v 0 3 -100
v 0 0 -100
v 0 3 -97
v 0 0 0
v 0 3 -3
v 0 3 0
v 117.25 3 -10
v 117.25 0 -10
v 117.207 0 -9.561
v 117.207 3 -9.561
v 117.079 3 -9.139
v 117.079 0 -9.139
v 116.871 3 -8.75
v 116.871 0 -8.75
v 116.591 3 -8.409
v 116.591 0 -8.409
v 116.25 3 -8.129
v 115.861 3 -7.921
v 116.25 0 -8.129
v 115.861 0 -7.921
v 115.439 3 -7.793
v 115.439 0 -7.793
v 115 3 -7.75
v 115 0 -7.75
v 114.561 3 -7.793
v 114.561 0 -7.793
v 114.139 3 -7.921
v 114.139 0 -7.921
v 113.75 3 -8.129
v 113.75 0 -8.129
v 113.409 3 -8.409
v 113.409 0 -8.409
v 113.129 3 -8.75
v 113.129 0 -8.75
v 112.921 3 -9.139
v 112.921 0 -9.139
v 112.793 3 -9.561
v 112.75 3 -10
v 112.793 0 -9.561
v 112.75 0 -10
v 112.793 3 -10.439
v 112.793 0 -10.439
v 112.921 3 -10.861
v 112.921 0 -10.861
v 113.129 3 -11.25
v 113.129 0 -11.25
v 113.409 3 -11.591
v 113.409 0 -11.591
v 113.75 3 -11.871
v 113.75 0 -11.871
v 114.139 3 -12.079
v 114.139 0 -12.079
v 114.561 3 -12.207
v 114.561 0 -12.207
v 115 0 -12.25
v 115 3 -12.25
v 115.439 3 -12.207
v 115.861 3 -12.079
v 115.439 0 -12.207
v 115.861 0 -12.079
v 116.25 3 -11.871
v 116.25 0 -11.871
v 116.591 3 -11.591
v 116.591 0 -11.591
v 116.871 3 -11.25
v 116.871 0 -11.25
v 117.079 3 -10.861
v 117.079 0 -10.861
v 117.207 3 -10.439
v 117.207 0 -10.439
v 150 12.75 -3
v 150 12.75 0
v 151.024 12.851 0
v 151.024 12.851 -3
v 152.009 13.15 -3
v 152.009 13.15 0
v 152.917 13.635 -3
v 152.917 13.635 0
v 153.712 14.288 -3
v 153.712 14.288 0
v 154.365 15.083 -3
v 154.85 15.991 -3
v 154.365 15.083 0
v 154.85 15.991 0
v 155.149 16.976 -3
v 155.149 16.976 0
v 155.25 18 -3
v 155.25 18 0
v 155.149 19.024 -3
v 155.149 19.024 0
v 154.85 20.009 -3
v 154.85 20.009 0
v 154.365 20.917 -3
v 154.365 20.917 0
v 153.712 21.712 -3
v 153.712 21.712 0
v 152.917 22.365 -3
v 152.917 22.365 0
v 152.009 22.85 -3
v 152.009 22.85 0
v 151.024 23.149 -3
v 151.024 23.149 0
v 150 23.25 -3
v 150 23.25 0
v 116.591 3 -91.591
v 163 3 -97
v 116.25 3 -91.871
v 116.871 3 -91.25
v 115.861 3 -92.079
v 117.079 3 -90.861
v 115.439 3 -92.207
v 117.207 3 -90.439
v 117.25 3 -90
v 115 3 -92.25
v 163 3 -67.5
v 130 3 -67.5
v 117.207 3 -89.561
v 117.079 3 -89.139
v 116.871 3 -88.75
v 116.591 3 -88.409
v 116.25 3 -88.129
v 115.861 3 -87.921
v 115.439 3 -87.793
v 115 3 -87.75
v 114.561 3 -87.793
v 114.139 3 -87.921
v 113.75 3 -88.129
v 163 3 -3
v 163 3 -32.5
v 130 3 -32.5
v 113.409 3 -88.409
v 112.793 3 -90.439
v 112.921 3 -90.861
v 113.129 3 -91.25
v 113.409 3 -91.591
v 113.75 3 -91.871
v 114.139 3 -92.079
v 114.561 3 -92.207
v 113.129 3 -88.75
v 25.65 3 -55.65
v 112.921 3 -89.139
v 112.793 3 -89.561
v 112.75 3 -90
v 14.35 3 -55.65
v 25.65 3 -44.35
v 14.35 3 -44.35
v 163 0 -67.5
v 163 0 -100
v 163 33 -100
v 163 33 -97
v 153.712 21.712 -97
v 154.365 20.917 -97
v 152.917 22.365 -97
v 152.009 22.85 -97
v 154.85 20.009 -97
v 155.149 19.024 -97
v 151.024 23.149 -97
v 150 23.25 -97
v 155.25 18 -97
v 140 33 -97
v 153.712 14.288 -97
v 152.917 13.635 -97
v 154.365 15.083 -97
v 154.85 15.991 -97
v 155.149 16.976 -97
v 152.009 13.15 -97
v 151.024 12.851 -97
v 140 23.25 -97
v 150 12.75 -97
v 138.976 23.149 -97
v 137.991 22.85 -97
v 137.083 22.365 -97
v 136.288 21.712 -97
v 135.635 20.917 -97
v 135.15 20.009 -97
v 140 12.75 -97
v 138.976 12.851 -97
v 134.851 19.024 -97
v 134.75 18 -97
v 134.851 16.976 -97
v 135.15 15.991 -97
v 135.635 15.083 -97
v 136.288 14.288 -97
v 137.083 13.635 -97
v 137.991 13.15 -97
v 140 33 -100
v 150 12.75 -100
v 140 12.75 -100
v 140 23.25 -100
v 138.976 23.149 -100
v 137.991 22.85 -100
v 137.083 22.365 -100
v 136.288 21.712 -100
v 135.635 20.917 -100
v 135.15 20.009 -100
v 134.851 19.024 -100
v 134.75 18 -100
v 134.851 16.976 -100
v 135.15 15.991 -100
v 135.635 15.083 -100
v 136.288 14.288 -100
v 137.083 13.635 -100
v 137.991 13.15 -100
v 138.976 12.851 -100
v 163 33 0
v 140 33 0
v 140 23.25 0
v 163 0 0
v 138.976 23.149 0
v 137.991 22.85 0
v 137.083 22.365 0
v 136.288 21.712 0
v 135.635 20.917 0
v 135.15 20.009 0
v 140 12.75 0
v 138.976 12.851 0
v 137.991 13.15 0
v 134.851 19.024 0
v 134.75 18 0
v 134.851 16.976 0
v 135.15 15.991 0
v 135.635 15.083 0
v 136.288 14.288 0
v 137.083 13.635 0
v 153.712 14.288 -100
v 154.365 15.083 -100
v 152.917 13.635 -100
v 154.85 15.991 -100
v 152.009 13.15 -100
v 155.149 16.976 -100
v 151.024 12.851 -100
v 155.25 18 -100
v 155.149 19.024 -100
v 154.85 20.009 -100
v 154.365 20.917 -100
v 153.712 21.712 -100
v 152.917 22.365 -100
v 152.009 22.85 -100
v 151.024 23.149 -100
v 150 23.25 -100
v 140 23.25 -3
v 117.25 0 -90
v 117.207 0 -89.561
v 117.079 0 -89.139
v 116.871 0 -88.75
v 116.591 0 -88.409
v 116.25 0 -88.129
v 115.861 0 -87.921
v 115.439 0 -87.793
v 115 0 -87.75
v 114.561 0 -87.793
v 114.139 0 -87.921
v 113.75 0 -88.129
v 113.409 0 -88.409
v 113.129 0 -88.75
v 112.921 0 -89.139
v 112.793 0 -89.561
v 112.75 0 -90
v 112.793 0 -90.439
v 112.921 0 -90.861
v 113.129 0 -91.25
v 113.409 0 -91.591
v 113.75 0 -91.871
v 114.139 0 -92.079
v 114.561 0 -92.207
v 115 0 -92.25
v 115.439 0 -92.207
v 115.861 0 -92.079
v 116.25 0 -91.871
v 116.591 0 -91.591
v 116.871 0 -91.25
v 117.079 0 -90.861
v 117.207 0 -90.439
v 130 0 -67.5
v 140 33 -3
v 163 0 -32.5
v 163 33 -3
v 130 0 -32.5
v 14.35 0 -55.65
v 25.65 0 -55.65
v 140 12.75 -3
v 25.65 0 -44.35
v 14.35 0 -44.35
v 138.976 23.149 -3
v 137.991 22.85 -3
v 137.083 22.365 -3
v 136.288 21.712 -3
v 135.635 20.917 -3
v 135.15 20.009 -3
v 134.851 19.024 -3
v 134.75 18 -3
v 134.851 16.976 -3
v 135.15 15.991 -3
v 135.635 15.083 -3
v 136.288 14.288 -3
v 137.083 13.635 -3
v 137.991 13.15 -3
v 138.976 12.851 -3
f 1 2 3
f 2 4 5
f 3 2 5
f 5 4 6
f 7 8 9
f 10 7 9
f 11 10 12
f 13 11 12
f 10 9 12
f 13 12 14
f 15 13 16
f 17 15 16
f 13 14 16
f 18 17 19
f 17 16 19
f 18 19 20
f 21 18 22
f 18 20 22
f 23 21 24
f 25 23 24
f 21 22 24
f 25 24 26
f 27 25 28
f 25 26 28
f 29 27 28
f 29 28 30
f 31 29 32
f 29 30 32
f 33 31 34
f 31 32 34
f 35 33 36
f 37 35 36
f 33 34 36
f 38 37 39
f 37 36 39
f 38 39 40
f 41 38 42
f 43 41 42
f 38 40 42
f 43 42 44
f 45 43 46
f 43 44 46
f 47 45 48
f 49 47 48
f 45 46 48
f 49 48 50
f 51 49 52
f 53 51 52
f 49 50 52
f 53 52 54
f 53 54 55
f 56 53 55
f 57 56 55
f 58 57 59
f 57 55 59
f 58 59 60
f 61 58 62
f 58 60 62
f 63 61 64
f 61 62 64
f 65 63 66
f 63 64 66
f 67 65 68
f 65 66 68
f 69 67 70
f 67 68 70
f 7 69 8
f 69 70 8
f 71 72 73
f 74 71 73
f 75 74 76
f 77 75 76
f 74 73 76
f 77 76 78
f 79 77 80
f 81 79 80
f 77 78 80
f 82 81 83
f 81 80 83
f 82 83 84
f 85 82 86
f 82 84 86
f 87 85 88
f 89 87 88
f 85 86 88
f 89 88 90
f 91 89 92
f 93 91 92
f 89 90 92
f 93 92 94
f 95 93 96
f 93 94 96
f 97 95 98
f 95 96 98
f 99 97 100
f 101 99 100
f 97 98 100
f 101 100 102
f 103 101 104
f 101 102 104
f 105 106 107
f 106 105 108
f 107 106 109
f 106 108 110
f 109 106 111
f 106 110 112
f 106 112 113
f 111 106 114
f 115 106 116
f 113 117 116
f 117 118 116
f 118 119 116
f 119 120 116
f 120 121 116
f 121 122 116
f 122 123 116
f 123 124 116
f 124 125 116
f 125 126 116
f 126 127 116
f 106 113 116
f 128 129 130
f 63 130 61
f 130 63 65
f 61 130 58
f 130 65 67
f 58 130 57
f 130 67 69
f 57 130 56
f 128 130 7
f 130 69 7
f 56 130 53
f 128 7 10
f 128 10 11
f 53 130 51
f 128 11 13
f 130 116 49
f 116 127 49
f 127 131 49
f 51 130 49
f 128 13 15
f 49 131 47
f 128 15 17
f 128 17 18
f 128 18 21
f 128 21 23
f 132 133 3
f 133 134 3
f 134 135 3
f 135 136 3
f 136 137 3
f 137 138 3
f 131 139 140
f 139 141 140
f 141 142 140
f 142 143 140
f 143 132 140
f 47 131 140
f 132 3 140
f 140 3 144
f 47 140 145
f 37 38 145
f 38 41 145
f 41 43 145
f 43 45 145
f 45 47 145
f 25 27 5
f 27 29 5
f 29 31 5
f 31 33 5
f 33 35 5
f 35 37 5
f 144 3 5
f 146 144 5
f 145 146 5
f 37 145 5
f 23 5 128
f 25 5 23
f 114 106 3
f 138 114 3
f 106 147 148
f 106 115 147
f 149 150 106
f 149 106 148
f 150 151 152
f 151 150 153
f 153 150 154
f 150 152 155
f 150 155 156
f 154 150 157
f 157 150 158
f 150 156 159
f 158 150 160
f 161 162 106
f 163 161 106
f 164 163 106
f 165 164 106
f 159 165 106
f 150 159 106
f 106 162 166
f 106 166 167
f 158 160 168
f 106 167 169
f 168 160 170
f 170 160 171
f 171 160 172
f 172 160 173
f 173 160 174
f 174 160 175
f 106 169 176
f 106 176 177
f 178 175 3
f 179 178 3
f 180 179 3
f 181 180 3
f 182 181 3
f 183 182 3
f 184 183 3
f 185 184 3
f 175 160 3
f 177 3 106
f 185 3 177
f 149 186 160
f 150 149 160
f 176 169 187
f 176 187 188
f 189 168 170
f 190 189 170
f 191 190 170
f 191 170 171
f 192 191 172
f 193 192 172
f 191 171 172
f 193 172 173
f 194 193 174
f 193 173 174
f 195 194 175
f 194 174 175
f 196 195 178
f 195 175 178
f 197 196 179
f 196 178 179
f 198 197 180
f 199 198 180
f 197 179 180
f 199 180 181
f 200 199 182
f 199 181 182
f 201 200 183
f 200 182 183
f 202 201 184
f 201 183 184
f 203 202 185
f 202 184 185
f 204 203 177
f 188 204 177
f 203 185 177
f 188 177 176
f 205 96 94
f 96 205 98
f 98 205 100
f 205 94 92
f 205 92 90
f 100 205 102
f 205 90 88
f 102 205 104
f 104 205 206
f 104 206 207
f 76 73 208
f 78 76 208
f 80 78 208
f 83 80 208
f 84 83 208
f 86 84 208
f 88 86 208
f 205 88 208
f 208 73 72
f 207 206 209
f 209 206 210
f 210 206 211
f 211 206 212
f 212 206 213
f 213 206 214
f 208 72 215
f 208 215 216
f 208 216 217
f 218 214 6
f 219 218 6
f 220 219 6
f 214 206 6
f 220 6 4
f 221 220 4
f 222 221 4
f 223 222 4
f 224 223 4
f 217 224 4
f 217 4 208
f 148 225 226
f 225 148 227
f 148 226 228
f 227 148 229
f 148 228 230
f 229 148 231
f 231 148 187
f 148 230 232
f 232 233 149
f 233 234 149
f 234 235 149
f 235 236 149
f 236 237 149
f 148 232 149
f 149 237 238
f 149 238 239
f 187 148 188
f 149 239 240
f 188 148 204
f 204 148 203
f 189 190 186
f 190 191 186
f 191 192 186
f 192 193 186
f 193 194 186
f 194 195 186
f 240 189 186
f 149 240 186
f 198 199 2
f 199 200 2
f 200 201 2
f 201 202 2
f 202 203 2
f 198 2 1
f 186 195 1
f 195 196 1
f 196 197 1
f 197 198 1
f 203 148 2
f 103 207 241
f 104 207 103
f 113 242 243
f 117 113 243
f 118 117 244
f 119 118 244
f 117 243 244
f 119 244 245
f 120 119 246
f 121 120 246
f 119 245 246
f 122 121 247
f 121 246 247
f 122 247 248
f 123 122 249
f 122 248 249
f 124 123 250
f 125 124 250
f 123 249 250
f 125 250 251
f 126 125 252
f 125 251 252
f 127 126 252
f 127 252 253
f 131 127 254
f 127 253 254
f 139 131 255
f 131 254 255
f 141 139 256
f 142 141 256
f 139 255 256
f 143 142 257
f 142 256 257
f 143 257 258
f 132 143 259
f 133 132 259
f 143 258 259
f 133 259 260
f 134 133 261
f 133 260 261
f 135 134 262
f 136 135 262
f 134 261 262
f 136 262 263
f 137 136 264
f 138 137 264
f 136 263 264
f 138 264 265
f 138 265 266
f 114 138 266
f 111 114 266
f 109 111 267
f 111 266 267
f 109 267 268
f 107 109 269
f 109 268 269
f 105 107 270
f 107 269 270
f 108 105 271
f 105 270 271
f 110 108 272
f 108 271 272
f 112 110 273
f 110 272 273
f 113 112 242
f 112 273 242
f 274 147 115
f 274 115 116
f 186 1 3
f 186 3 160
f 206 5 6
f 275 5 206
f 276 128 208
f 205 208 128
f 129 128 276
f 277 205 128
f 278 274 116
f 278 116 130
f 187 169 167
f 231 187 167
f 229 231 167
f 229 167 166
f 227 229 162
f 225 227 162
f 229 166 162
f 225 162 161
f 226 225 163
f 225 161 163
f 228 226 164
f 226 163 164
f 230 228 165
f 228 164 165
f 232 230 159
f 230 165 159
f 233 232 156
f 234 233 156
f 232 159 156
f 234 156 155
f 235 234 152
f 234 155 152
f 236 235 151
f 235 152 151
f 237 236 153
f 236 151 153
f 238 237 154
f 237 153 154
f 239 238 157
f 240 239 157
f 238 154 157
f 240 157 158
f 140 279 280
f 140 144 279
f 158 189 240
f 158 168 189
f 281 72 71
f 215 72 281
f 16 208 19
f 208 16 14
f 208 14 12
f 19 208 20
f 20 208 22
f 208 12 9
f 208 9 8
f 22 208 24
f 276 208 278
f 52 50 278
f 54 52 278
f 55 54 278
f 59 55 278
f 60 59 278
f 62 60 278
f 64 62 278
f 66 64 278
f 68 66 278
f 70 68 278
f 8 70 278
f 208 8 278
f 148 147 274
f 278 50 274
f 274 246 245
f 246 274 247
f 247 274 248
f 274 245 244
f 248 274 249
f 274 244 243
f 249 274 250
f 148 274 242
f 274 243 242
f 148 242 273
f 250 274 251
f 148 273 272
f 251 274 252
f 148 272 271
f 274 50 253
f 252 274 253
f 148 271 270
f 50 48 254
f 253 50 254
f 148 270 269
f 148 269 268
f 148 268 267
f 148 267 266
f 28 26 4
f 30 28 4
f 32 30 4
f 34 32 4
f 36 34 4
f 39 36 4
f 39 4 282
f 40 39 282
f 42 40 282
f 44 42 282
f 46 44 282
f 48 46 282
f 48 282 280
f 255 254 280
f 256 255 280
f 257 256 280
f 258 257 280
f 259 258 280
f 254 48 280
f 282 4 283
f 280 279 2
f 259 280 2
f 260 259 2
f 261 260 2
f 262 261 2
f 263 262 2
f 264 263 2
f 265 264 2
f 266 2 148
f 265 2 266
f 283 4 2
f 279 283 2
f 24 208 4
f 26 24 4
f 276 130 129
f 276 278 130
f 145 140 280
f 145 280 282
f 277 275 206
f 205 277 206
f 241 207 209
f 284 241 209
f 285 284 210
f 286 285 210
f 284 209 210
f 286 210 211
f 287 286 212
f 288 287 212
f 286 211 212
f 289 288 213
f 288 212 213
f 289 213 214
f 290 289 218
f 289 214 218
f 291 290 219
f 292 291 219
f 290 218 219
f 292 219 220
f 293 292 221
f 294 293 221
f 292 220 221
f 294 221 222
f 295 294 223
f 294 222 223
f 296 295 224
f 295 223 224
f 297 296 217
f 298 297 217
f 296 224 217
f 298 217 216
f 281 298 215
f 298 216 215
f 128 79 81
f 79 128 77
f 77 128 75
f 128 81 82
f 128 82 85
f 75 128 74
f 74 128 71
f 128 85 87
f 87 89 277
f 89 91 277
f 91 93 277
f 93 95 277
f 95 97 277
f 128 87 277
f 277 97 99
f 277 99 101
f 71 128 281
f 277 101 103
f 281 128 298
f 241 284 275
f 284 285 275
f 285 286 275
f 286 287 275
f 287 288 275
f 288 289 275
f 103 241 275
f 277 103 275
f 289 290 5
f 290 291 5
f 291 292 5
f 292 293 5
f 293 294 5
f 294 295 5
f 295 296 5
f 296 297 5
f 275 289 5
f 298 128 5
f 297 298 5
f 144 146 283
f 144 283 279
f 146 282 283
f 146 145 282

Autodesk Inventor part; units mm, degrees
ref_plane "YZ Plane" through (0, 0, 0) normal (1, 0, 0) x (0, 1, 0)
ref_plane "XZ Plane" through (0, 0, 0) normal (0, 1, 0) x (-1, 0, 0)
ref_plane "XY Plane" through (0, 0, 0) normal (0, 0, 1) x (1, 0, 0)
sketch "Náčrt1" plane through (0, 0, 0) normal (1, 0, 0) x (0, 1, 0)
  line L0 (0, 0) -> (0, -100)
  line L1 (0, -100) -> (33, -100)
  line L2 (33, -100) -> (33, -97)
  line L3 (33, -97) -> (3, -97)
  line L4 (3, -97) -> (3, -3)
  line L5 (3, -3) -> (33, -3)
  line L6 (33, -3) -> (33, 0)
  line L7 (33, 0) -> (0, 0)
  dimension "d0" = 100
  dimension "d1" = 33
  dimension "d2" = 3
  dimension "d3" = 30
  dimension "d4" = 94
  dimension "d5" = 30
  dimension "d6" = 3
extrude "Vysunutí1" add sketch "Náčrt1" along normal blind 160
sketch "Náčrt4" plane through (0, 3, -3) normal (0, 1, 0) x (1, 0, 0)
  line L0 (0, 94) -> (0, 0) projected
  line L1 (0, 0) -> (160, 0) projected
  line L2 (160, 94) -> (160, 0) projected
  line L3 (0, 94) -> (160, 94) projected
  line L4 (14.35, 52.65) -> (25.65, 52.65)
  line L5 (25.65, 52.65) -> (25.65, 41.35)
  line L6 (25.65, 41.35) -> (14.35, 41.35)
  line L7 (14.35, 41.35) -> (14.35, 52.65)
  line L8 (0, 97) -> (160, 97) projected
  point P0 (0, -3)
  point P1 (20, 41.35)
  point P2 (14.35, 47)
  dimension "d104" = 11.3
  dimension "d105" = 11.3
  dimension "d106" = 50
  dimension "d107" = 140
extrude "Vysunutí4" cut sketch "Náčrt4" against normal through all contours L4 L5 L6 L7
sketch "Náčrt7" plane through (0, 0, -100) normal (0, -1, 0) x (1, 0, 0)
  line L0 (0, 100) -> (0, 0) projected
  line L1 (0, 0) -> (160, 0) projected
  line L2 (160, 100) -> (160, 0) projected
  line L3 (0, 100) -> (160, 100) projected
  circle A0 centre (115, 90) radius 2.25
  circle A1 centre (115, 10) radius 2.25
  dimension "d76" = 4.5
  dimension "d77" = 4.5
  dimension "d78" = 10
  dimension "d79" = 10
  dimension "d80" = 115
  dimension "d81" = 115
extrude "Vysunutí7" cut sketch "Náčrt7" against normal through all contours A0 | A1
sketch "Náčrt8" plane through (0, 0, -100) normal (0, 0, -1) x (-1, 0, 0)
  line L0 (0, 0) -> (0, 33) projected
  line L1 (0, 33) -> (-160, 33) projected
  line L2 (-160, 0) -> (-160, 33) projected
  line L3 (0, 0) -> (-160, 0) projected
  line L4 (0, 3) -> (-160, 3) projected
  line L5 (0, 0) -> (0, 33) projected
  line L6 (0, 3) -> (-140, 33)
  line L7 (0, 33) -> (-160, 33) projected
  line L8 (0, 3) -> (0, 33)
  line L9 (0, 33) -> (-140, 33)
  dimension "d85" = 140
  dimension "d86" = 30
extrude "Vysunutí8" cut sketch "Náčrt8" against normal through all contours L6 L1 L0
sketch "Náčrt9" plane through (0, 0, -100) normal (0, -1, 0) x (1, 0, 0)
  circle A0 centre (115, 90) radius 2.25 projected
  circle A1 centre (115, 10) radius 2.25 projected
  line L0 (0, 100) -> (0, 0) projected
  line L1 (0, 0) -> (160, 0) projected
  line L2 (160, 100) -> (160, 0) projected
  line L3 (0, 100) -> (160, 100) projected
  line L4 (130, 67.5) -> (160, 67.5)
  line L5 (160, 67.5) -> (160, 32.5)
  line L6 (160, 32.5) -> (130, 32.5)
  line L7 (130, 32.5) -> (130, 67.5)
  line L8 (160, 100) -> (160, 0) projected
  point P0 (130, 50)
  dimension "d90" = 35
  dimension "d91" = 50
  dimension "d92" = 30
  dimension "d93" = 30
extrude "Vysunutí9" cut sketch "Náčrt9" against normal through all contours L2 L6 L7 L4
sketch "Náčrt10" plane through (160, 0, 0) normal (1, 0, 0) x (0, 0, -1)
  line L0 (67.5, 3) -> (67.5, 0) projected
  line L1 (67.5, 0) -> (100, 0) projected
  line L2 (100, 0) -> (100, 33) projected
  line L3 (100, 33) -> (97, 33) projected
  line L4 (97, 33) -> (97, 3) projected
  line L5 (97, 3) -> (67.5, 3) projected
  line L6 (32.5, 0) -> (32.5, 3) projected
  line L7 (32.5, 3) -> (3, 3) projected
  line L8 (3, 3) -> (3, 33) projected
  line L9 (3, 33) -> (0, 33) projected
  line L10 (0, 33) -> (0, 0) projected
  line L11 (0, 0) -> (32.5, 0) projected
extrude "Vysunutí10" add sketch "Náčrt10" along normal blind 3
sketch "Náčrt11" plane through (0, 0, 0) normal (0, 0, 1) x (1, 0, 0)
  line L0 (140, 33) -> (0, 3) projected
  line L1 (0, 3) -> (0, 0) projected
  line L2 (0, 0) -> (163, 0) projected
  line L3 (163, 33) -> (163, 0) projected
  line L4 (140, 33) -> (163, 33) projected
  arc A0 (150, 12.75) -> (150, 23.25) centre (150, 18) ccw
  arc A1 (140, 23.25) -> (140, 12.75) centre (140, 18) ccw
  line L5 (150, 12.75) -> (140, 12.75)
  line L6 (140, 23.25) -> (150, 23.25)
  dimension "d98" = 10.5
  dimension "d99" = 10.5
  dimension "d100" = 10
  dimension "d101" = 13
  dimension "d108" = 15
extrude "Vysunutí11" cut sketch "Náčrt11" against normal through all contours L5 A1 L6 A0
properties part number "U-profil 100x40 - pod case"
